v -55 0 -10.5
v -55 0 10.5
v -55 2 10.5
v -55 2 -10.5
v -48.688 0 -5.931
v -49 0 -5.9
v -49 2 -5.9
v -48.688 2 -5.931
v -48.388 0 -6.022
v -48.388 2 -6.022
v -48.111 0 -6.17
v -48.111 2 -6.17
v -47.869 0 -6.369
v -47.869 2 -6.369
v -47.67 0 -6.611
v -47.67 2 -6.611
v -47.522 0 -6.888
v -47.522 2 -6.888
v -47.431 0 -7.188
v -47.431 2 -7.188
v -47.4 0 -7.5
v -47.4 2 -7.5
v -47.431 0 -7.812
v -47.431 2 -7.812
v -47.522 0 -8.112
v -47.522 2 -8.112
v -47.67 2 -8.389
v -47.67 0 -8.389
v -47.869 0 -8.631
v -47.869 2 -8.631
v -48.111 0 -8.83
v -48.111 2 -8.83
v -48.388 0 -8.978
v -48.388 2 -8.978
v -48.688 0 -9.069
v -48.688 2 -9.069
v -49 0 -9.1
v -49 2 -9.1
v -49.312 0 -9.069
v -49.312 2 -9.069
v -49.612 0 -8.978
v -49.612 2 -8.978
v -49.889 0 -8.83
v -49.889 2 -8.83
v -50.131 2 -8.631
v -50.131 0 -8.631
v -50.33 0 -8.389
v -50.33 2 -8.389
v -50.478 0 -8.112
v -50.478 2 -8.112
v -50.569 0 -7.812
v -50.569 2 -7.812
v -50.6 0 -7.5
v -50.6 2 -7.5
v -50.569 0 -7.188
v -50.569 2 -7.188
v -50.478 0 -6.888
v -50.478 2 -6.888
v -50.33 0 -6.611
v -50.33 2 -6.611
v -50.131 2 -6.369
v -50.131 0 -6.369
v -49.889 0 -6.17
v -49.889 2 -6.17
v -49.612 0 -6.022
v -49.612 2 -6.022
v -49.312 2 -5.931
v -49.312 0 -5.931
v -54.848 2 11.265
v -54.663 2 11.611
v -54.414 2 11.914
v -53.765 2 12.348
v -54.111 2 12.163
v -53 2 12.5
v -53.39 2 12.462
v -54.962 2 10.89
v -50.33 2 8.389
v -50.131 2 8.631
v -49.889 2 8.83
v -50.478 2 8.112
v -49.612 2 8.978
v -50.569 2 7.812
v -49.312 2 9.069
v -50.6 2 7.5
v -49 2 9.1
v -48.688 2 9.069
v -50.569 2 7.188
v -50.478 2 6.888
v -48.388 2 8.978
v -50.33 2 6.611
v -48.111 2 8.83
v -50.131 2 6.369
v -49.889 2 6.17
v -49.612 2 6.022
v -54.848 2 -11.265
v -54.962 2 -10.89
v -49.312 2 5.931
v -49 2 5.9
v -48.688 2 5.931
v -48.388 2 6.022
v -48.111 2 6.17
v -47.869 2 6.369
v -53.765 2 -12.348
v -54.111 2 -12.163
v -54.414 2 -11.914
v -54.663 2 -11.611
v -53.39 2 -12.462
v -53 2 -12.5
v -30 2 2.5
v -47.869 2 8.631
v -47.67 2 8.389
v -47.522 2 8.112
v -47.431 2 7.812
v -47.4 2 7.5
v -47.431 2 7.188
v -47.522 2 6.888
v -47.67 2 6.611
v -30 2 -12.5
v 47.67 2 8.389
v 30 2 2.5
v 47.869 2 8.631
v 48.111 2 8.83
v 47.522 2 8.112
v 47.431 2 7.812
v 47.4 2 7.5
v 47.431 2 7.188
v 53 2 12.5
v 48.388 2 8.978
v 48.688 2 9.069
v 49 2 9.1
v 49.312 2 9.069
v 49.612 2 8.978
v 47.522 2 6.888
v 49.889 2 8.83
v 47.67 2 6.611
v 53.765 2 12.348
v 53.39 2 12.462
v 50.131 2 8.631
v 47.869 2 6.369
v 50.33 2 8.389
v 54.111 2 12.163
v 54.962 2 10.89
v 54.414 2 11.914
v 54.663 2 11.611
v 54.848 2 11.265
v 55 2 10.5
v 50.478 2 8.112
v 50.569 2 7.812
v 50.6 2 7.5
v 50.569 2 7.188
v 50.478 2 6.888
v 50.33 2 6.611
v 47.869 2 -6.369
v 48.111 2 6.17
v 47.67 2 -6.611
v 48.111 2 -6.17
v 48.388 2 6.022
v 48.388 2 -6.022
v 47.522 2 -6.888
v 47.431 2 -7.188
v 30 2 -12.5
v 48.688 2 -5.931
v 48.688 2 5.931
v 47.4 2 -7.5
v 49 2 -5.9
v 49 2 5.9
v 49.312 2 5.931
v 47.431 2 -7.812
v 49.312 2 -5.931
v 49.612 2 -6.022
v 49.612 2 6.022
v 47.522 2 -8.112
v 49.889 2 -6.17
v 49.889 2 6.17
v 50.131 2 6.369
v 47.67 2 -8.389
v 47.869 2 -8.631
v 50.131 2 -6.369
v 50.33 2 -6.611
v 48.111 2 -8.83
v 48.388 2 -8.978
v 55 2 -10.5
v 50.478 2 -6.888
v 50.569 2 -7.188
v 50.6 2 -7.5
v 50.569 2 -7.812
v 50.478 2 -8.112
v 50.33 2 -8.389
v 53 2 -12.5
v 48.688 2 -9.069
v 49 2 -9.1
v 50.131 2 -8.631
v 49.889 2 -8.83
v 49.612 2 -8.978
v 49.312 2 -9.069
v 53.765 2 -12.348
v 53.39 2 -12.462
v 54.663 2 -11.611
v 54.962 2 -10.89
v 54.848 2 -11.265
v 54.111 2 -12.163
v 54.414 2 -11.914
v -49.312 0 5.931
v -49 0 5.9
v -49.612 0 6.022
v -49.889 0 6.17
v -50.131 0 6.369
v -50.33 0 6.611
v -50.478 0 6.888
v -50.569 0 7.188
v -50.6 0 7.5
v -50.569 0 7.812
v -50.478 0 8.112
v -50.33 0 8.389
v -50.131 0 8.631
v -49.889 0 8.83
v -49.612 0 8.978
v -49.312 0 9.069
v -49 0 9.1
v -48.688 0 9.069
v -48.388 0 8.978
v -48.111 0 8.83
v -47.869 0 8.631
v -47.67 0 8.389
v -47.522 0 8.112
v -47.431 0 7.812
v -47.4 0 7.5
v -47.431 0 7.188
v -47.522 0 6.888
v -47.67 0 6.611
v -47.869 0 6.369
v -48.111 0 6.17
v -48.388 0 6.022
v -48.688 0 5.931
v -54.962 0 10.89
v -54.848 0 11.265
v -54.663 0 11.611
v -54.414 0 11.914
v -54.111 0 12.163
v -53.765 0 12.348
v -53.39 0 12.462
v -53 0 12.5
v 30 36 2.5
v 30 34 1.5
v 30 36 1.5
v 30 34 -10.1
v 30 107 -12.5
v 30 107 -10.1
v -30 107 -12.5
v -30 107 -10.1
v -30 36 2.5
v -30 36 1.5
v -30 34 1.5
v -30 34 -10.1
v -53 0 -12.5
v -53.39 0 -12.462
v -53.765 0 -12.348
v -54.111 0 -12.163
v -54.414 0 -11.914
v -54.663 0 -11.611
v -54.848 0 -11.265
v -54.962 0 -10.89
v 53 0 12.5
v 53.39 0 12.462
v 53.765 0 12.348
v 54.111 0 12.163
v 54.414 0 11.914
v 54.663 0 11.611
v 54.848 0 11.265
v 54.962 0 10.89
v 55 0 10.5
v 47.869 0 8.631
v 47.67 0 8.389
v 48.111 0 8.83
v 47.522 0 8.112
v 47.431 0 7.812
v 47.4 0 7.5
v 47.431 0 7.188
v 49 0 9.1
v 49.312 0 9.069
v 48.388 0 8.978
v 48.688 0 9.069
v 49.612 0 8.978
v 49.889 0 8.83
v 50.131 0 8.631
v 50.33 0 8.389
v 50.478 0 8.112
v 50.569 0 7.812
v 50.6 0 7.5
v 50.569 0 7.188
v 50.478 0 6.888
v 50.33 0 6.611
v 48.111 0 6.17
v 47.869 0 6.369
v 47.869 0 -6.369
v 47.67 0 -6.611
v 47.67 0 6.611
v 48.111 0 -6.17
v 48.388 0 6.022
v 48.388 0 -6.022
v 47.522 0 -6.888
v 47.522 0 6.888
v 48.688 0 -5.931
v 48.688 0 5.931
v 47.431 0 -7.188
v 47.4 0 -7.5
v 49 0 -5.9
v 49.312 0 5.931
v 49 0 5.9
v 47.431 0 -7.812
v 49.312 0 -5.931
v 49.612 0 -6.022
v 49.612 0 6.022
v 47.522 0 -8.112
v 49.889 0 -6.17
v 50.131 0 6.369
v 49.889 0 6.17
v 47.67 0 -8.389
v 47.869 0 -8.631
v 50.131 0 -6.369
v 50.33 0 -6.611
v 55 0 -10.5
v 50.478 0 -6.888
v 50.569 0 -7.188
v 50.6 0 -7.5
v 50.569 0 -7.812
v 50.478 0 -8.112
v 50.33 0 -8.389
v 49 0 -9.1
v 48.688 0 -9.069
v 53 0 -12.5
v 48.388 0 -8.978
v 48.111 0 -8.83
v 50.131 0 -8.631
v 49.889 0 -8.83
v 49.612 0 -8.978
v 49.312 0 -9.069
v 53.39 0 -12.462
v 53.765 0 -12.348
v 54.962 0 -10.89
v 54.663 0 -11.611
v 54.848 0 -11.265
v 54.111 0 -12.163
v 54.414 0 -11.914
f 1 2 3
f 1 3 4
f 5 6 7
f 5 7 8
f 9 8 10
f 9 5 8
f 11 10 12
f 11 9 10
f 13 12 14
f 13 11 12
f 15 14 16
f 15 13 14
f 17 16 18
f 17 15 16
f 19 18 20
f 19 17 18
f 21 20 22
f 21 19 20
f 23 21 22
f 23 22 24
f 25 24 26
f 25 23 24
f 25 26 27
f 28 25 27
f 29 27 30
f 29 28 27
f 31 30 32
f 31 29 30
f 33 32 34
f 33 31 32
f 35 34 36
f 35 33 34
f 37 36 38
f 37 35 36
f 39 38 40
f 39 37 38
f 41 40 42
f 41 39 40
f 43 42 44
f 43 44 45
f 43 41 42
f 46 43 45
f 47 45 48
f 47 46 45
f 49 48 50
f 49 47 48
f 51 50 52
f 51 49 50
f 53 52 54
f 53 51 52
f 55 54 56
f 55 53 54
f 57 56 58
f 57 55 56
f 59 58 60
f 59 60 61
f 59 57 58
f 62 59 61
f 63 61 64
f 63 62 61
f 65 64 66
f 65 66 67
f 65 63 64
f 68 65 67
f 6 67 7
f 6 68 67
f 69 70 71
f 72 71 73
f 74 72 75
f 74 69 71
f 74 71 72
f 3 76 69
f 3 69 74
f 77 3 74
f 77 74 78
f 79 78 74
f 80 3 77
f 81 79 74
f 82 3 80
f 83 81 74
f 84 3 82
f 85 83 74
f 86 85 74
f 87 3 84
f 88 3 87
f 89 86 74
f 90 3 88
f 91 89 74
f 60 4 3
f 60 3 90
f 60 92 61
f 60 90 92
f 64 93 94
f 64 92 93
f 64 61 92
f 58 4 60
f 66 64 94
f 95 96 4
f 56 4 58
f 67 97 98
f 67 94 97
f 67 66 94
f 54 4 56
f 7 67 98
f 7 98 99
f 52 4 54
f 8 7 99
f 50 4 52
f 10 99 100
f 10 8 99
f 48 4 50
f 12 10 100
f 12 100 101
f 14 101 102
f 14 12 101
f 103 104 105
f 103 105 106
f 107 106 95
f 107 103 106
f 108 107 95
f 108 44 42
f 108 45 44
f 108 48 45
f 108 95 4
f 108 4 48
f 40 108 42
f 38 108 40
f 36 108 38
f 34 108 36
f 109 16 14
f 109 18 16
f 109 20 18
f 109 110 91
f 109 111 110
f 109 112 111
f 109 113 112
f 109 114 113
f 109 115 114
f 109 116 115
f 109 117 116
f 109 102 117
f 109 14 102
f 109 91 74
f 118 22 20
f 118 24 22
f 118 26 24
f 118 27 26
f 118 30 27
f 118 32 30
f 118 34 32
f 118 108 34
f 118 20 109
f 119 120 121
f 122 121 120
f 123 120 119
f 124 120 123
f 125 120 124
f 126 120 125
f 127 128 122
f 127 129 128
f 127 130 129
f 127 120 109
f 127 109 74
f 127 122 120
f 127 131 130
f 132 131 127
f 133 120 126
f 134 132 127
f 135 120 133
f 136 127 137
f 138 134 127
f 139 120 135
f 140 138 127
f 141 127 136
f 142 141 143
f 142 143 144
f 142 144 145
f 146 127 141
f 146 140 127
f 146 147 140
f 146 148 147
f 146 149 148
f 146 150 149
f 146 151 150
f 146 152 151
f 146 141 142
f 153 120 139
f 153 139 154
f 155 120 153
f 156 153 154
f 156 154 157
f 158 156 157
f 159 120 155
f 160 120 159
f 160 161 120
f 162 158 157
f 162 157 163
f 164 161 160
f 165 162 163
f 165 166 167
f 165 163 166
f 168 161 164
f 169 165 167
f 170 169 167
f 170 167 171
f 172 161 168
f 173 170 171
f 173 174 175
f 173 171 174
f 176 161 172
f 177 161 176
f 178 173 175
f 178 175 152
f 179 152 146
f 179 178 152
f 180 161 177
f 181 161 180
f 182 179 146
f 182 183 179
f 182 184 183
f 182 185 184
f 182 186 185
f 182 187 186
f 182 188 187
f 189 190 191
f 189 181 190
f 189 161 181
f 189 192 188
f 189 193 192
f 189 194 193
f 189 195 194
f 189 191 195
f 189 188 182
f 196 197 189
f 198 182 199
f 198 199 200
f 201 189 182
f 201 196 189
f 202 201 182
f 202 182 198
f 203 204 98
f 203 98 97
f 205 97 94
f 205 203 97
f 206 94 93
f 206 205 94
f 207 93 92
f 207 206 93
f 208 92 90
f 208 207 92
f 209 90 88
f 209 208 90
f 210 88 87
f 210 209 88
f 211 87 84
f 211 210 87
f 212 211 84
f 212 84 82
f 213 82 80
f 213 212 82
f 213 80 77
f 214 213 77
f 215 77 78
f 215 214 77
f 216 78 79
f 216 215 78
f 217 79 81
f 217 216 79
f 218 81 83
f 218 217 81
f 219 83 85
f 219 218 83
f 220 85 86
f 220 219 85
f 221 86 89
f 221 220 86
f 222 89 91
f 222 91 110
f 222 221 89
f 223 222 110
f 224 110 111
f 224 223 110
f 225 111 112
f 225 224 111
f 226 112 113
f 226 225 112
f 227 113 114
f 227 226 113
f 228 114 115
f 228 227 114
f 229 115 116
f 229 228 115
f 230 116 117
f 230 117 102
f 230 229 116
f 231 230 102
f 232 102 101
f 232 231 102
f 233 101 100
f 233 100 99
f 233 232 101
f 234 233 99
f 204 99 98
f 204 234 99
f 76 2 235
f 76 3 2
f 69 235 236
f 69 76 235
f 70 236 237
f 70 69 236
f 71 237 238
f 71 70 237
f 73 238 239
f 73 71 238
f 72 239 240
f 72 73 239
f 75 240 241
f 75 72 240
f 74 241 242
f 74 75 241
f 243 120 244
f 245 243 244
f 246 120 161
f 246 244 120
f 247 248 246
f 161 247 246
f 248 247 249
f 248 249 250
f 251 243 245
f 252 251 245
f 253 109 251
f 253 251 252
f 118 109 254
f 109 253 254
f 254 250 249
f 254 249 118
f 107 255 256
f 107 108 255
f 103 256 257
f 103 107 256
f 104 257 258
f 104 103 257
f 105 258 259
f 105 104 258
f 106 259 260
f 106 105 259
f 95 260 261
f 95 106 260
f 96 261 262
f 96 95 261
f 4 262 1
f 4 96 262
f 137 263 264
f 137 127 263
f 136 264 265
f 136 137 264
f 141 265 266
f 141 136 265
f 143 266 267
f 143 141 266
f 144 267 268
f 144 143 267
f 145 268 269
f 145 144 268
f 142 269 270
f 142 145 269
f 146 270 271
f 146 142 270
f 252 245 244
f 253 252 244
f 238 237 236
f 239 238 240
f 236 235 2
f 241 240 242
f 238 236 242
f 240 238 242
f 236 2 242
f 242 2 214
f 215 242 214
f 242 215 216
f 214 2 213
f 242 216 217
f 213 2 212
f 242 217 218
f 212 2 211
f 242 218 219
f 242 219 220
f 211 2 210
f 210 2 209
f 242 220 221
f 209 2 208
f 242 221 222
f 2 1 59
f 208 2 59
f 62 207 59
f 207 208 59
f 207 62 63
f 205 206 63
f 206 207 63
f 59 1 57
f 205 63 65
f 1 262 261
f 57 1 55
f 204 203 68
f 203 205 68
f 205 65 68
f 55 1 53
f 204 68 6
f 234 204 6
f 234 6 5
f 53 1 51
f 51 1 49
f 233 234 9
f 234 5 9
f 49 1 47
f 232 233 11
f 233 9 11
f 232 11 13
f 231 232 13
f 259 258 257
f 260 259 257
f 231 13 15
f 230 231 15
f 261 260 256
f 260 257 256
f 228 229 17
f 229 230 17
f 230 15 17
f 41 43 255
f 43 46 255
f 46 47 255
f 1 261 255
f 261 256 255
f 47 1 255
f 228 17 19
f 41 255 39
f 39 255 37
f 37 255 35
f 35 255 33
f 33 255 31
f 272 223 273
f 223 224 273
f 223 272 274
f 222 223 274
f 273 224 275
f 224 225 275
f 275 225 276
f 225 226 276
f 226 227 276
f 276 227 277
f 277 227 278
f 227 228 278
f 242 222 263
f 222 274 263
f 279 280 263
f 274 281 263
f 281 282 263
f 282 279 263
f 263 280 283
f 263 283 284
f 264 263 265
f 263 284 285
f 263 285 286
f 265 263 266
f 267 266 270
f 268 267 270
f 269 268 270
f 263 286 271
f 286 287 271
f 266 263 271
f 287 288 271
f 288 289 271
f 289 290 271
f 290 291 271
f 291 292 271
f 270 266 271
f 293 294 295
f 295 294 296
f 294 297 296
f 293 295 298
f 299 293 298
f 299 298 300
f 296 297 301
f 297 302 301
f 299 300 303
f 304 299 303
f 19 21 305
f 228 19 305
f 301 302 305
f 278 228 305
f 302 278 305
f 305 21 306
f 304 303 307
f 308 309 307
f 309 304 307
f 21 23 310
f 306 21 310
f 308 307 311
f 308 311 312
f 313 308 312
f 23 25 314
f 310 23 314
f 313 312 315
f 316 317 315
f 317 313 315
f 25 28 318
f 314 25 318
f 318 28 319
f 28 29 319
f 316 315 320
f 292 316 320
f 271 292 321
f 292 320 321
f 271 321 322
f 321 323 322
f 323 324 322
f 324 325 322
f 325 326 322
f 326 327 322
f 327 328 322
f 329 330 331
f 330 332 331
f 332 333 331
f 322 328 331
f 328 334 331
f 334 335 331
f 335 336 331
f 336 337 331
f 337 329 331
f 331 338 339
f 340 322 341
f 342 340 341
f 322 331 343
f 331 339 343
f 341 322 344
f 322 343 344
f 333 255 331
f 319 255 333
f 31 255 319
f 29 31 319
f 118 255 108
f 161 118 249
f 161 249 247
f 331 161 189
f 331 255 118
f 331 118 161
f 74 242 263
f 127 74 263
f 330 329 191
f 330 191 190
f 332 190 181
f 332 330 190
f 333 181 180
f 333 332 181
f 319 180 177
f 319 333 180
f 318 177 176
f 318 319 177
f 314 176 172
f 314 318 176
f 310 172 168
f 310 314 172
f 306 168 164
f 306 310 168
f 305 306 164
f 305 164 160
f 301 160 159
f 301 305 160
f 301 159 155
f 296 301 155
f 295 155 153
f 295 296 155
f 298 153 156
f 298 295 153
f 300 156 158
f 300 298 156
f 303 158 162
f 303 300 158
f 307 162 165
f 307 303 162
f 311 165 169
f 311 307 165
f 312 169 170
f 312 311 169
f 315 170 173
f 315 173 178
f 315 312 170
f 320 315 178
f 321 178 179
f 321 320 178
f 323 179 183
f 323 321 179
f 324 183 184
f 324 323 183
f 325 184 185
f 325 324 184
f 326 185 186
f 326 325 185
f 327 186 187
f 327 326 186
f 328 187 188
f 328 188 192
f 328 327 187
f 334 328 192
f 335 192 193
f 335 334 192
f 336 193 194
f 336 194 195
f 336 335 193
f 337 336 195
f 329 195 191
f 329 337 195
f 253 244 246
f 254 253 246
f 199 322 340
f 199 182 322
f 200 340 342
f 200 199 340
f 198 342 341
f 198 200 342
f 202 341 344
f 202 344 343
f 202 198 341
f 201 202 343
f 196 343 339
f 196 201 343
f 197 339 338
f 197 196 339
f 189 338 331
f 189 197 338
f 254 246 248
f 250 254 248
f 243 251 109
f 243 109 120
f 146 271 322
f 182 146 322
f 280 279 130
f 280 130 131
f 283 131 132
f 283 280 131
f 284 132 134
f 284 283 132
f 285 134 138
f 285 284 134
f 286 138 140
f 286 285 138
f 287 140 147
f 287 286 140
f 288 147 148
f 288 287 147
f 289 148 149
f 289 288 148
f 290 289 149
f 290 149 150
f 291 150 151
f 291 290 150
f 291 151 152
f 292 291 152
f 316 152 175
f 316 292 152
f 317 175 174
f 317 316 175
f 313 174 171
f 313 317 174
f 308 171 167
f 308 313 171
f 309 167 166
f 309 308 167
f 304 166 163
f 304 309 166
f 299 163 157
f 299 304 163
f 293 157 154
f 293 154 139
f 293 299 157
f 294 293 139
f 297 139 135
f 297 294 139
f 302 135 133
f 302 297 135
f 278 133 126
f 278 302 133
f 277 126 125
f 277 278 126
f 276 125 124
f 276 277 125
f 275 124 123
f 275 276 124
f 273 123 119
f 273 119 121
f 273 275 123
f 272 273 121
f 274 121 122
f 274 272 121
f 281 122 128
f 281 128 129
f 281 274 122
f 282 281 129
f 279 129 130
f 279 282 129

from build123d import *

# Parameters (mm, degrees)
SKETCH_1_W          = 110
SKETCH_1_H          = 25
SKETCH_1_R          = 1.6
EXTRUDE_1_DEPTH     = 2
SKETCH_2_W          = 60
SKETCH_2_H          = 15
EXTRUDE_2_DEPTH     = 113
CUT_EXTRUDE_1_DEPTH = 60
FILLET_1_R          = 2
FILLET_2_R          = 2
FILLET_3_R          = 2
FILLET_4_R          = 2
CUT_EXTRUDE_3_DEPTH = 144.5487722
SKETCH_8_W          = 60
SKETCH_8_H          = 6
CUT_EXTRUDE_4_DEPTH = 128.690093586


with BuildPart() as part:
    # 草图1 → 凸台-拉伸1 (new body)
    with BuildSketch(Plane(origin=(0, 0, 0), x_dir=(1, 0, 0), z_dir=(0, 1, 0))):
        Rectangle(SKETCH_1_W, SKETCH_1_H)
        with Locations(Location((-49, 7.5, 0), (0, 0, 270))):
            Circle(SKETCH_1_R, mode=Mode.SUBTRACT)
        with Locations(Location((49, 7.5, 0), (0, 0, 90))):
            Circle(SKETCH_1_R, mode=Mode.SUBTRACT)
        with Locations(Location((49, -7.5, 0), (0, 0, 270))):
            Circle(SKETCH_1_R, mode=Mode.SUBTRACT)
        with Locations(Location((-49, -7.5, 0), (0, 0, 90))):
            Circle(SKETCH_1_R, mode=Mode.SUBTRACT)
    extrude(amount=EXTRUDE_1_DEPTH)

    # 草图2 → 凸台-拉伸2 (add)
    with BuildSketch(Plane(origin=(0, 115, 0), x_dir=(1, 0, 0), z_dir=(0, 1, 0))):
        with Locations((0, 5)):
            Rectangle(SKETCH_2_W, SKETCH_2_H)
    extrude(amount=-EXTRUDE_2_DEPTH)

    # 草图3 → 切除-拉伸1 (cut)
    with BuildSketch(Plane(origin=(30, 0, 0), x_dir=(0, 0, -1), z_dir=(1, 0, 0))):
        Polygon((-2.5, 36), (-1.5, 36), (-1.5, 34), (10.1, 34), (10.1, 113), (-1.5, 113), (-1.5, 111), (-2.5, 111), align=None)
    extrude(amount=-CUT_EXTRUDE_1_DEPTH, mode=Mode.SUBTRACT)

    # 圆角1
    fillet_1_edges = [part.edges().sort_by_distance(p)[0] for p in [
        (55, 1, 12.5),
    ]]
    fillet(fillet_1_edges, radius=FILLET_1_R)

    # 圆角2
    fillet_2_edges = [part.edges().sort_by_distance(p)[0] for p in [
        (55, 1, -12.5),
    ]]
    fillet(fillet_2_edges, radius=FILLET_2_R)

    # 圆角3
    fillet_3_edges = [part.edges().sort_by_distance(p)[0] for p in [
        (-55, 1, -12.5),
    ]]
    fillet(fillet_3_edges, radius=FILLET_3_R)

    # 圆角4
    fillet_4_edges = [part.edges().sort_by_distance(p)[0] for p in [
        (-55, 1, 12.5),
    ]]
    fillet(fillet_4_edges, radius=FILLET_4_R)

    # 草图7 → 切除-拉伸3 (cut, through all)
    with BuildSketch(Plane(origin=(30, 0, 0), x_dir=(0, 0, -1), z_dir=(1, 0, 0))):
        Polygon((10.125373214, 107), (10.1, 113), (-1.5, 113), (-1.5, 110), (-2.572411073, 110), (-2.572411073, 115), (12.5, 115), (12.5, 107), align=None)
    extrude(amount=-CUT_EXTRUDE_3_DEPTH, mode=Mode.SUBTRACT)

    # 草图8 → 切除-拉伸4 (cut, through all)
    with BuildSketch(Plane.XY.offset(-10.1)):
        with Locations((0, 110)):
            Rectangle(SKETCH_8_W, SKETCH_8_H)
    extrude(amount=-CUT_EXTRUDE_4_DEPTH, mode=Mode.SUBTRACT)


solid = part.part
